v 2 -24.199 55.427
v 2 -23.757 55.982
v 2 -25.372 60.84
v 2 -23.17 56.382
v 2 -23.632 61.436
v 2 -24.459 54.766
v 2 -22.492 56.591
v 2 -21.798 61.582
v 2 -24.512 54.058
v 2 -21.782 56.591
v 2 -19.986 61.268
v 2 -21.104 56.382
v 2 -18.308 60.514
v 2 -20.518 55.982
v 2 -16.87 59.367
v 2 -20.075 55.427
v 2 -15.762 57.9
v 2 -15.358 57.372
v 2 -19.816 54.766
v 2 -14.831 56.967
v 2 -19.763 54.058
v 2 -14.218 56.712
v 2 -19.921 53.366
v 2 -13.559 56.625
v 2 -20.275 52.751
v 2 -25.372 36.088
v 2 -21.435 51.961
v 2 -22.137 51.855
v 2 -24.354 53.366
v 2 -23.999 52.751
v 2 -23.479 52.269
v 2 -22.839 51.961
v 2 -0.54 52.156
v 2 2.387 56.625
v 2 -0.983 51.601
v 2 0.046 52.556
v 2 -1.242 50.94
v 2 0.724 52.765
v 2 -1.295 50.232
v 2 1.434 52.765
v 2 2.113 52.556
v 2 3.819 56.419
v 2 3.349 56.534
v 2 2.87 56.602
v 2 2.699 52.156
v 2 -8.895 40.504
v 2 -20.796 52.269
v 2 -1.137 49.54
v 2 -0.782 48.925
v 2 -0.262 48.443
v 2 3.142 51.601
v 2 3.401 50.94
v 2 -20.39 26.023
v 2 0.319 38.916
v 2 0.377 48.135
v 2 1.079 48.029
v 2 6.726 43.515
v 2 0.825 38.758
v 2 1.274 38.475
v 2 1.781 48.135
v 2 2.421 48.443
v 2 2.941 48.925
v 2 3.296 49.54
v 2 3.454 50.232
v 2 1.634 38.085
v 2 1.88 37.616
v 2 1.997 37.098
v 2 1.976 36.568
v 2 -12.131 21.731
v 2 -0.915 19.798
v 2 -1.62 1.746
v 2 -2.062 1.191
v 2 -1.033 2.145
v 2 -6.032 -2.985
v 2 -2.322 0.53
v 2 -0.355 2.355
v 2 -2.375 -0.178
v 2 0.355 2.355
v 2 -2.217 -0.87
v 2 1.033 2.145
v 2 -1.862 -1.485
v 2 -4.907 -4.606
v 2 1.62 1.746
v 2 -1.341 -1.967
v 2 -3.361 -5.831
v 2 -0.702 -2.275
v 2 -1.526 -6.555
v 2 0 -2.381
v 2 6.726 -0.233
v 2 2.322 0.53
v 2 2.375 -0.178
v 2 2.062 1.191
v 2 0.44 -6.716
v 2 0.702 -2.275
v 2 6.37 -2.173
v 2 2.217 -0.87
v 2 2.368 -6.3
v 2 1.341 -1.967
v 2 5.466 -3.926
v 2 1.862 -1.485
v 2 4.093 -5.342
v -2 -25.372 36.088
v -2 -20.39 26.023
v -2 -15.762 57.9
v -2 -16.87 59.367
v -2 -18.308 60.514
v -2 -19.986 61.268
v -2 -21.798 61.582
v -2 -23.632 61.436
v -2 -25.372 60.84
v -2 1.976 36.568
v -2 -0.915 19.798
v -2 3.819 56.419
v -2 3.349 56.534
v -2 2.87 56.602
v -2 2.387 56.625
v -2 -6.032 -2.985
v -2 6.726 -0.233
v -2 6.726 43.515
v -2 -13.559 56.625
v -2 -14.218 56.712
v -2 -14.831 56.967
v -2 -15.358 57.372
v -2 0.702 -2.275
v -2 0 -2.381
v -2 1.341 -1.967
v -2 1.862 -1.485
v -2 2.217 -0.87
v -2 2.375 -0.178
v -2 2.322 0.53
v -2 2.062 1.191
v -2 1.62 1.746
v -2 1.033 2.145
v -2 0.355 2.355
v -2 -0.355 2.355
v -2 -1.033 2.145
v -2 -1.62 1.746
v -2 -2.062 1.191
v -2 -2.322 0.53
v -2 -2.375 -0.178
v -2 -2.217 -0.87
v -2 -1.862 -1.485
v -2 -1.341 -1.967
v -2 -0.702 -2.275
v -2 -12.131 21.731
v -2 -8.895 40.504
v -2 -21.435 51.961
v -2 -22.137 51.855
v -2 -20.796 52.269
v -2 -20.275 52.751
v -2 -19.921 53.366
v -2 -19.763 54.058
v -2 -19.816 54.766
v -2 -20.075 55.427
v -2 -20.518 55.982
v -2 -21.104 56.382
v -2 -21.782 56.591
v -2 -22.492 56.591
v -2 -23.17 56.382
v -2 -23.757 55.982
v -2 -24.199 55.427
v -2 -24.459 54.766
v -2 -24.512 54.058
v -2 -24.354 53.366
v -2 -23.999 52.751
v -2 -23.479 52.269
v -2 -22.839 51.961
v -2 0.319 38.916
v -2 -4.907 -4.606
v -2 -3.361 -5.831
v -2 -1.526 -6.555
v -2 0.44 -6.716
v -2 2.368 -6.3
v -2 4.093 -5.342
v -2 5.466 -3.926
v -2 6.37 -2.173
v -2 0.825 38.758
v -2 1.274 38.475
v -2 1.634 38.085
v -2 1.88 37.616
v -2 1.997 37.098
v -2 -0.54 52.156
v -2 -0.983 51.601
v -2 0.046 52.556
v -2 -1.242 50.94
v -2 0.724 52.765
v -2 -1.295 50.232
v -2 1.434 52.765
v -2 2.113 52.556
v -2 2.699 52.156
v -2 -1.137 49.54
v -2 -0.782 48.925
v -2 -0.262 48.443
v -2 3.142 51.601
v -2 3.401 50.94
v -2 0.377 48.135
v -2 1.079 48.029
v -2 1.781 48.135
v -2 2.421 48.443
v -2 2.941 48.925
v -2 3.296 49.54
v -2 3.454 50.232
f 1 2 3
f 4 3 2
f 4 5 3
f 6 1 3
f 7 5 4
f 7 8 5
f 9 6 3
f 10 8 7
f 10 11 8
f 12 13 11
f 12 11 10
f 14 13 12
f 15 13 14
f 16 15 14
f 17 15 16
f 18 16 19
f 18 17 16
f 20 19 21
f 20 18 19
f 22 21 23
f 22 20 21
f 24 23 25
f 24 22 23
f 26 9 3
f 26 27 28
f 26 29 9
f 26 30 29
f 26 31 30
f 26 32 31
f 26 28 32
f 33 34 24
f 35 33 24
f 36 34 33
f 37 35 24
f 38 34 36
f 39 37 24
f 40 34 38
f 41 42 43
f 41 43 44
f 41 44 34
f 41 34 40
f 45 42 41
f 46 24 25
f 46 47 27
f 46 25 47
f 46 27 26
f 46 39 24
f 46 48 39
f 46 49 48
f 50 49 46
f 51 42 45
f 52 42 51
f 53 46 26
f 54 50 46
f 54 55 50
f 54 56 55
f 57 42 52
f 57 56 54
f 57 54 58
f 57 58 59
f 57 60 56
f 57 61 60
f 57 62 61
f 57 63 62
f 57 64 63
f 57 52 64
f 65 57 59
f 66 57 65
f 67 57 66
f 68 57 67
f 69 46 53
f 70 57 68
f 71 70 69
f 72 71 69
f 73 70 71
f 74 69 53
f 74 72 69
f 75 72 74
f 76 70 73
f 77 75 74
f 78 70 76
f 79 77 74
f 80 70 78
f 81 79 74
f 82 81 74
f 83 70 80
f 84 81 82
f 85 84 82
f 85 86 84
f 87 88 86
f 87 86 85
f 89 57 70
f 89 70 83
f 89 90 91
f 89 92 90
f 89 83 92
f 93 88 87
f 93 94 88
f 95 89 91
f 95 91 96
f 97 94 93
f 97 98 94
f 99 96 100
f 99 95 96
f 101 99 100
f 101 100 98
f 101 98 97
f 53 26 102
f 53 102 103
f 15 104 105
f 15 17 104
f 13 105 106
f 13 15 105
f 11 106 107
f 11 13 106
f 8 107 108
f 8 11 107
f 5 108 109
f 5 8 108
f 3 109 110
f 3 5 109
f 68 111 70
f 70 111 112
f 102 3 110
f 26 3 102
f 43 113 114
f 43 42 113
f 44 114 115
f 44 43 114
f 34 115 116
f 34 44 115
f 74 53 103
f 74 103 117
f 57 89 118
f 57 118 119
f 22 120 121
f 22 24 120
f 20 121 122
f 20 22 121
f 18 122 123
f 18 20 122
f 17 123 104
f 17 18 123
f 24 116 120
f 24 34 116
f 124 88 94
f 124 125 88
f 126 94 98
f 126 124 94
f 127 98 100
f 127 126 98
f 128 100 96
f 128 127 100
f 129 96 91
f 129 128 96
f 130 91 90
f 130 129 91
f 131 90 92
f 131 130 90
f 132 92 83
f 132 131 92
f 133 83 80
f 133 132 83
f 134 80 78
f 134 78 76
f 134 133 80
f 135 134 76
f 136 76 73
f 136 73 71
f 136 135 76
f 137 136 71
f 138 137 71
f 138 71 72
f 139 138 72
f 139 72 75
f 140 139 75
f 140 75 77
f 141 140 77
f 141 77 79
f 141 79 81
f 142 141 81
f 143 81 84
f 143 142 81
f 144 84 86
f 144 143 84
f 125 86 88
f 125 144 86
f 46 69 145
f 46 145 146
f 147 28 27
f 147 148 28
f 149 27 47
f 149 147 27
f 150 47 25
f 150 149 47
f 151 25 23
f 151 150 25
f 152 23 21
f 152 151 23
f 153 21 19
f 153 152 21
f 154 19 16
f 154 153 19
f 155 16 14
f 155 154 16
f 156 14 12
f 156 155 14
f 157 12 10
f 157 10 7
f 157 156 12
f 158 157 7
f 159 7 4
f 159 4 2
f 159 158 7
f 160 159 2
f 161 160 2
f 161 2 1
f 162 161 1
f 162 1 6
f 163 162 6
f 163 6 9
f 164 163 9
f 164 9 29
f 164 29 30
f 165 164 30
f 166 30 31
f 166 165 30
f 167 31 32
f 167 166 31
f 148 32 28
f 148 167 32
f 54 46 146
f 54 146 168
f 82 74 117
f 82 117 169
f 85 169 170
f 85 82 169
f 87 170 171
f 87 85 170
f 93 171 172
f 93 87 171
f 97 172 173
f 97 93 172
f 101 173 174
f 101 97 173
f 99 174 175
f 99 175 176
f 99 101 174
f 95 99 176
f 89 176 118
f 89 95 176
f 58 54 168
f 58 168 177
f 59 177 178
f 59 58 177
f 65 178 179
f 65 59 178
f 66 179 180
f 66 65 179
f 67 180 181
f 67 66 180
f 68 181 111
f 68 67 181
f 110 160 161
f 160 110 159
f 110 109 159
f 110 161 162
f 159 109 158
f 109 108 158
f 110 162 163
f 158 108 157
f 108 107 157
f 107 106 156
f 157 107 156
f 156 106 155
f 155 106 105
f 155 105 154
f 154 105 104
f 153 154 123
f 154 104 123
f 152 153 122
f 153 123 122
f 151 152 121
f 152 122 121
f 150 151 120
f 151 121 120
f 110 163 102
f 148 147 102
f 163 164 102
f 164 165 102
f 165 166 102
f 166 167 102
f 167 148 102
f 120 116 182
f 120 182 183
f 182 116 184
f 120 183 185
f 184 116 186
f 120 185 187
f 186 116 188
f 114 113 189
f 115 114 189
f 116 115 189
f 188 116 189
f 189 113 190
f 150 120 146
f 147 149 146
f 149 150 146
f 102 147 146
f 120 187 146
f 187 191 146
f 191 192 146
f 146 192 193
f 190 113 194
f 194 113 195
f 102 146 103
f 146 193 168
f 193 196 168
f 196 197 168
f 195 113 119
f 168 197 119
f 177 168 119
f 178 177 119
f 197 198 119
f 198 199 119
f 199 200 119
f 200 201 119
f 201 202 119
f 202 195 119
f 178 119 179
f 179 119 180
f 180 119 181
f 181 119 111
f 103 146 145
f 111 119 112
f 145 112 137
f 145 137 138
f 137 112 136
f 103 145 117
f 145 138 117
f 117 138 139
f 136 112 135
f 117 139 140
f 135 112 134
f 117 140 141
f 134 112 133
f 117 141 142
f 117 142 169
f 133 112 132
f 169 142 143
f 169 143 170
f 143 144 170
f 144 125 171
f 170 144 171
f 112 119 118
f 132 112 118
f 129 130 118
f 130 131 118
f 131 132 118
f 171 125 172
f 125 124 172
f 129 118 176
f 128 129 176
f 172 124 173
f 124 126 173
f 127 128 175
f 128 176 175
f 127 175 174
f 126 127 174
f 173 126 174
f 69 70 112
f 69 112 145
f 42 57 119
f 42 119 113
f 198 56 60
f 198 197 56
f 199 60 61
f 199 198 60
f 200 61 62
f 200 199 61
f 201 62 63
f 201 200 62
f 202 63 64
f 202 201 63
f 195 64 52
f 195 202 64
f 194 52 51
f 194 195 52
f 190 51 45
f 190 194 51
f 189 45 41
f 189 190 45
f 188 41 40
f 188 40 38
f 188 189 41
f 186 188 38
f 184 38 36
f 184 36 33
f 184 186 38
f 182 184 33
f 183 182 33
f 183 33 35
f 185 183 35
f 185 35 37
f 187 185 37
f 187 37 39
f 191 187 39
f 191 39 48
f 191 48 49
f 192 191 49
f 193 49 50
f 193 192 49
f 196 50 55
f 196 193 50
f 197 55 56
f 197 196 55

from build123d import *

# Parameters (mm, degrees)
SKETCH1_R           = 2.38125
BOSS_EXTRUDE1_DEPTH = 2


with BuildPart() as part:
    # Sketch1 → Boss-Extrude1 (new, symmetric)
    with BuildSketch(Plane(origin=(0, 0, 0), x_dir=(0, 0, -1), z_dir=(1, 0, 0))):
        with BuildLine():
            Line((-60.839919999, -25.371860345), (-36.087520647, -25.371860345))
            Line((-36.087520647, -25.371860345), (-26.022794648, -20.390042329))
            Line((-26.022794648, -20.390042329), (2.985497353, -6.031575768))
            ThreePointArc((2.985497353, -6.031575768), (6.578628627, 1.419417511), (0.23290188, 6.72598375))
            Line((0.23290188, 6.72598375), (-43.515144264, 6.72598375))
            Line((-43.515144264, 6.72598375), (-56.419454373, 3.818772093))
            ThreePointArc((-56.419454373, 3.818772093), (-56.573650174, 3.11024955), (-56.625400227, 2.386991318))
            Line((-56.625400227, 2.386991318), (-56.625400227, -13.559221537))
            ThreePointArc((-56.625400227, -13.559221537), (-56.966991368, -14.831463057), (-57.899887224, -15.761510537))
            ThreePointArc((-57.899887224, -15.761510537), (-61.267882579, -19.98604889), (-60.839919999, -25.371860345))
        make_face()
        with Locations((-54.236184525, -22.137211246)):
            Circle(SKETCH1_R, mode=Mode.SUBTRACT)
        with Locations((-50.410128911, 1.079375692)):
            Circle(SKETCH1_R, mode=Mode.SUBTRACT)
        with BuildLine():
            ThreePointArc((-38.916021454, 0.318688833), (-38.085451708, 1.633557707), (-36.568397511, 1.976008906))
            Line((-36.568397511, 1.976008906), (-19.797694446, -0.914638547))
            Line((-19.797694446, -0.914638547), (-21.730897843, -12.13052726))
            Line((-21.730897843, -12.13052726), (-40.504072916, -8.894727872))
            Line((-40.504072916, -8.894727872), (-38.916021454, 0.318688833))
        make_face(mode=Mode.SUBTRACT)
        Circle(SKETCH1_R, mode=Mode.SUBTRACT)
    extrude(amount=BOSS_EXTRUDE1_DEPTH, both=True)


solid = part.part
